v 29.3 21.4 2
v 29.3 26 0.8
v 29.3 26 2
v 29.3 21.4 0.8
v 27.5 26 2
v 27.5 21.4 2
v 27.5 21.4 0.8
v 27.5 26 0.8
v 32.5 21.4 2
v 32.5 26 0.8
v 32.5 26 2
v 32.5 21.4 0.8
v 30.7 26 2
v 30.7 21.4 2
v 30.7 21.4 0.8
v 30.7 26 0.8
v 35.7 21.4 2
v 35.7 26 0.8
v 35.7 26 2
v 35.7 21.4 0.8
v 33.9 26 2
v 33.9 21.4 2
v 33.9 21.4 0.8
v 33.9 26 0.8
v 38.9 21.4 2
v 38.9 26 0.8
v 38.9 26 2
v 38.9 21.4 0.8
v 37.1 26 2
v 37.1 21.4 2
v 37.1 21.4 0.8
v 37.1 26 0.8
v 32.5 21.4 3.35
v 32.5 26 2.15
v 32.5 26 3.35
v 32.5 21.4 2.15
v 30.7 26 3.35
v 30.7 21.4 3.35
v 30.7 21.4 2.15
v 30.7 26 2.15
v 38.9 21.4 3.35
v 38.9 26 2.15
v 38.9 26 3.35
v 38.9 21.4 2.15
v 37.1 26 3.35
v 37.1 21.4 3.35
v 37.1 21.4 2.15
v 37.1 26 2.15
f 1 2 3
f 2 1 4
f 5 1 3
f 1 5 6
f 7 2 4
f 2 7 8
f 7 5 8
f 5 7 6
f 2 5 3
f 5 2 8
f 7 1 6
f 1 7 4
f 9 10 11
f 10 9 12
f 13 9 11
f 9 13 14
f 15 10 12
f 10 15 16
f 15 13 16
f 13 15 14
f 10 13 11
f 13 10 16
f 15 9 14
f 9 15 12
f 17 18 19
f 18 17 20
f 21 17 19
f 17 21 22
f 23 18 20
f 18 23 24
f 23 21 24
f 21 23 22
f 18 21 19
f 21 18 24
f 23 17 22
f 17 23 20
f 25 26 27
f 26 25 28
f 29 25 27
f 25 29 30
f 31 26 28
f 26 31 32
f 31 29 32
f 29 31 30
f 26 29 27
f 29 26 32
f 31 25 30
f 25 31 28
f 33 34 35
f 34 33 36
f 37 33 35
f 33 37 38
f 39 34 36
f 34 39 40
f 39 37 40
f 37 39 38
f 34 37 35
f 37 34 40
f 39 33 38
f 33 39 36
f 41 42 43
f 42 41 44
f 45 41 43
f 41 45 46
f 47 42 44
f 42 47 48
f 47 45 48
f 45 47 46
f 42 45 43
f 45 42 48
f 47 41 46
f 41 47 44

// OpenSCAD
union() {
  translate([27.5, 21.4, 0.8]) cube(size=[1.8,4.6,1.2], center=false);
  translate([30.7, 21.4, 0.8]) cube(size=[1.8,4.6,1.2], center=false);
  translate([33.9, 21.4, 0.8]) cube(size=[1.8,4.6,1.2], center=false);
  translate([37.1, 21.4, 0.8]) cube(size=[1.8,4.6,1.2], center=false);

  translate([30.7, 21.4, 2.15]) cube(size=[1.8,4.6,1.2], center=false);
  translate([37.1, 21.4, 2.15]) cube(size=[1.8,4.6,1.2], center=false);
}
